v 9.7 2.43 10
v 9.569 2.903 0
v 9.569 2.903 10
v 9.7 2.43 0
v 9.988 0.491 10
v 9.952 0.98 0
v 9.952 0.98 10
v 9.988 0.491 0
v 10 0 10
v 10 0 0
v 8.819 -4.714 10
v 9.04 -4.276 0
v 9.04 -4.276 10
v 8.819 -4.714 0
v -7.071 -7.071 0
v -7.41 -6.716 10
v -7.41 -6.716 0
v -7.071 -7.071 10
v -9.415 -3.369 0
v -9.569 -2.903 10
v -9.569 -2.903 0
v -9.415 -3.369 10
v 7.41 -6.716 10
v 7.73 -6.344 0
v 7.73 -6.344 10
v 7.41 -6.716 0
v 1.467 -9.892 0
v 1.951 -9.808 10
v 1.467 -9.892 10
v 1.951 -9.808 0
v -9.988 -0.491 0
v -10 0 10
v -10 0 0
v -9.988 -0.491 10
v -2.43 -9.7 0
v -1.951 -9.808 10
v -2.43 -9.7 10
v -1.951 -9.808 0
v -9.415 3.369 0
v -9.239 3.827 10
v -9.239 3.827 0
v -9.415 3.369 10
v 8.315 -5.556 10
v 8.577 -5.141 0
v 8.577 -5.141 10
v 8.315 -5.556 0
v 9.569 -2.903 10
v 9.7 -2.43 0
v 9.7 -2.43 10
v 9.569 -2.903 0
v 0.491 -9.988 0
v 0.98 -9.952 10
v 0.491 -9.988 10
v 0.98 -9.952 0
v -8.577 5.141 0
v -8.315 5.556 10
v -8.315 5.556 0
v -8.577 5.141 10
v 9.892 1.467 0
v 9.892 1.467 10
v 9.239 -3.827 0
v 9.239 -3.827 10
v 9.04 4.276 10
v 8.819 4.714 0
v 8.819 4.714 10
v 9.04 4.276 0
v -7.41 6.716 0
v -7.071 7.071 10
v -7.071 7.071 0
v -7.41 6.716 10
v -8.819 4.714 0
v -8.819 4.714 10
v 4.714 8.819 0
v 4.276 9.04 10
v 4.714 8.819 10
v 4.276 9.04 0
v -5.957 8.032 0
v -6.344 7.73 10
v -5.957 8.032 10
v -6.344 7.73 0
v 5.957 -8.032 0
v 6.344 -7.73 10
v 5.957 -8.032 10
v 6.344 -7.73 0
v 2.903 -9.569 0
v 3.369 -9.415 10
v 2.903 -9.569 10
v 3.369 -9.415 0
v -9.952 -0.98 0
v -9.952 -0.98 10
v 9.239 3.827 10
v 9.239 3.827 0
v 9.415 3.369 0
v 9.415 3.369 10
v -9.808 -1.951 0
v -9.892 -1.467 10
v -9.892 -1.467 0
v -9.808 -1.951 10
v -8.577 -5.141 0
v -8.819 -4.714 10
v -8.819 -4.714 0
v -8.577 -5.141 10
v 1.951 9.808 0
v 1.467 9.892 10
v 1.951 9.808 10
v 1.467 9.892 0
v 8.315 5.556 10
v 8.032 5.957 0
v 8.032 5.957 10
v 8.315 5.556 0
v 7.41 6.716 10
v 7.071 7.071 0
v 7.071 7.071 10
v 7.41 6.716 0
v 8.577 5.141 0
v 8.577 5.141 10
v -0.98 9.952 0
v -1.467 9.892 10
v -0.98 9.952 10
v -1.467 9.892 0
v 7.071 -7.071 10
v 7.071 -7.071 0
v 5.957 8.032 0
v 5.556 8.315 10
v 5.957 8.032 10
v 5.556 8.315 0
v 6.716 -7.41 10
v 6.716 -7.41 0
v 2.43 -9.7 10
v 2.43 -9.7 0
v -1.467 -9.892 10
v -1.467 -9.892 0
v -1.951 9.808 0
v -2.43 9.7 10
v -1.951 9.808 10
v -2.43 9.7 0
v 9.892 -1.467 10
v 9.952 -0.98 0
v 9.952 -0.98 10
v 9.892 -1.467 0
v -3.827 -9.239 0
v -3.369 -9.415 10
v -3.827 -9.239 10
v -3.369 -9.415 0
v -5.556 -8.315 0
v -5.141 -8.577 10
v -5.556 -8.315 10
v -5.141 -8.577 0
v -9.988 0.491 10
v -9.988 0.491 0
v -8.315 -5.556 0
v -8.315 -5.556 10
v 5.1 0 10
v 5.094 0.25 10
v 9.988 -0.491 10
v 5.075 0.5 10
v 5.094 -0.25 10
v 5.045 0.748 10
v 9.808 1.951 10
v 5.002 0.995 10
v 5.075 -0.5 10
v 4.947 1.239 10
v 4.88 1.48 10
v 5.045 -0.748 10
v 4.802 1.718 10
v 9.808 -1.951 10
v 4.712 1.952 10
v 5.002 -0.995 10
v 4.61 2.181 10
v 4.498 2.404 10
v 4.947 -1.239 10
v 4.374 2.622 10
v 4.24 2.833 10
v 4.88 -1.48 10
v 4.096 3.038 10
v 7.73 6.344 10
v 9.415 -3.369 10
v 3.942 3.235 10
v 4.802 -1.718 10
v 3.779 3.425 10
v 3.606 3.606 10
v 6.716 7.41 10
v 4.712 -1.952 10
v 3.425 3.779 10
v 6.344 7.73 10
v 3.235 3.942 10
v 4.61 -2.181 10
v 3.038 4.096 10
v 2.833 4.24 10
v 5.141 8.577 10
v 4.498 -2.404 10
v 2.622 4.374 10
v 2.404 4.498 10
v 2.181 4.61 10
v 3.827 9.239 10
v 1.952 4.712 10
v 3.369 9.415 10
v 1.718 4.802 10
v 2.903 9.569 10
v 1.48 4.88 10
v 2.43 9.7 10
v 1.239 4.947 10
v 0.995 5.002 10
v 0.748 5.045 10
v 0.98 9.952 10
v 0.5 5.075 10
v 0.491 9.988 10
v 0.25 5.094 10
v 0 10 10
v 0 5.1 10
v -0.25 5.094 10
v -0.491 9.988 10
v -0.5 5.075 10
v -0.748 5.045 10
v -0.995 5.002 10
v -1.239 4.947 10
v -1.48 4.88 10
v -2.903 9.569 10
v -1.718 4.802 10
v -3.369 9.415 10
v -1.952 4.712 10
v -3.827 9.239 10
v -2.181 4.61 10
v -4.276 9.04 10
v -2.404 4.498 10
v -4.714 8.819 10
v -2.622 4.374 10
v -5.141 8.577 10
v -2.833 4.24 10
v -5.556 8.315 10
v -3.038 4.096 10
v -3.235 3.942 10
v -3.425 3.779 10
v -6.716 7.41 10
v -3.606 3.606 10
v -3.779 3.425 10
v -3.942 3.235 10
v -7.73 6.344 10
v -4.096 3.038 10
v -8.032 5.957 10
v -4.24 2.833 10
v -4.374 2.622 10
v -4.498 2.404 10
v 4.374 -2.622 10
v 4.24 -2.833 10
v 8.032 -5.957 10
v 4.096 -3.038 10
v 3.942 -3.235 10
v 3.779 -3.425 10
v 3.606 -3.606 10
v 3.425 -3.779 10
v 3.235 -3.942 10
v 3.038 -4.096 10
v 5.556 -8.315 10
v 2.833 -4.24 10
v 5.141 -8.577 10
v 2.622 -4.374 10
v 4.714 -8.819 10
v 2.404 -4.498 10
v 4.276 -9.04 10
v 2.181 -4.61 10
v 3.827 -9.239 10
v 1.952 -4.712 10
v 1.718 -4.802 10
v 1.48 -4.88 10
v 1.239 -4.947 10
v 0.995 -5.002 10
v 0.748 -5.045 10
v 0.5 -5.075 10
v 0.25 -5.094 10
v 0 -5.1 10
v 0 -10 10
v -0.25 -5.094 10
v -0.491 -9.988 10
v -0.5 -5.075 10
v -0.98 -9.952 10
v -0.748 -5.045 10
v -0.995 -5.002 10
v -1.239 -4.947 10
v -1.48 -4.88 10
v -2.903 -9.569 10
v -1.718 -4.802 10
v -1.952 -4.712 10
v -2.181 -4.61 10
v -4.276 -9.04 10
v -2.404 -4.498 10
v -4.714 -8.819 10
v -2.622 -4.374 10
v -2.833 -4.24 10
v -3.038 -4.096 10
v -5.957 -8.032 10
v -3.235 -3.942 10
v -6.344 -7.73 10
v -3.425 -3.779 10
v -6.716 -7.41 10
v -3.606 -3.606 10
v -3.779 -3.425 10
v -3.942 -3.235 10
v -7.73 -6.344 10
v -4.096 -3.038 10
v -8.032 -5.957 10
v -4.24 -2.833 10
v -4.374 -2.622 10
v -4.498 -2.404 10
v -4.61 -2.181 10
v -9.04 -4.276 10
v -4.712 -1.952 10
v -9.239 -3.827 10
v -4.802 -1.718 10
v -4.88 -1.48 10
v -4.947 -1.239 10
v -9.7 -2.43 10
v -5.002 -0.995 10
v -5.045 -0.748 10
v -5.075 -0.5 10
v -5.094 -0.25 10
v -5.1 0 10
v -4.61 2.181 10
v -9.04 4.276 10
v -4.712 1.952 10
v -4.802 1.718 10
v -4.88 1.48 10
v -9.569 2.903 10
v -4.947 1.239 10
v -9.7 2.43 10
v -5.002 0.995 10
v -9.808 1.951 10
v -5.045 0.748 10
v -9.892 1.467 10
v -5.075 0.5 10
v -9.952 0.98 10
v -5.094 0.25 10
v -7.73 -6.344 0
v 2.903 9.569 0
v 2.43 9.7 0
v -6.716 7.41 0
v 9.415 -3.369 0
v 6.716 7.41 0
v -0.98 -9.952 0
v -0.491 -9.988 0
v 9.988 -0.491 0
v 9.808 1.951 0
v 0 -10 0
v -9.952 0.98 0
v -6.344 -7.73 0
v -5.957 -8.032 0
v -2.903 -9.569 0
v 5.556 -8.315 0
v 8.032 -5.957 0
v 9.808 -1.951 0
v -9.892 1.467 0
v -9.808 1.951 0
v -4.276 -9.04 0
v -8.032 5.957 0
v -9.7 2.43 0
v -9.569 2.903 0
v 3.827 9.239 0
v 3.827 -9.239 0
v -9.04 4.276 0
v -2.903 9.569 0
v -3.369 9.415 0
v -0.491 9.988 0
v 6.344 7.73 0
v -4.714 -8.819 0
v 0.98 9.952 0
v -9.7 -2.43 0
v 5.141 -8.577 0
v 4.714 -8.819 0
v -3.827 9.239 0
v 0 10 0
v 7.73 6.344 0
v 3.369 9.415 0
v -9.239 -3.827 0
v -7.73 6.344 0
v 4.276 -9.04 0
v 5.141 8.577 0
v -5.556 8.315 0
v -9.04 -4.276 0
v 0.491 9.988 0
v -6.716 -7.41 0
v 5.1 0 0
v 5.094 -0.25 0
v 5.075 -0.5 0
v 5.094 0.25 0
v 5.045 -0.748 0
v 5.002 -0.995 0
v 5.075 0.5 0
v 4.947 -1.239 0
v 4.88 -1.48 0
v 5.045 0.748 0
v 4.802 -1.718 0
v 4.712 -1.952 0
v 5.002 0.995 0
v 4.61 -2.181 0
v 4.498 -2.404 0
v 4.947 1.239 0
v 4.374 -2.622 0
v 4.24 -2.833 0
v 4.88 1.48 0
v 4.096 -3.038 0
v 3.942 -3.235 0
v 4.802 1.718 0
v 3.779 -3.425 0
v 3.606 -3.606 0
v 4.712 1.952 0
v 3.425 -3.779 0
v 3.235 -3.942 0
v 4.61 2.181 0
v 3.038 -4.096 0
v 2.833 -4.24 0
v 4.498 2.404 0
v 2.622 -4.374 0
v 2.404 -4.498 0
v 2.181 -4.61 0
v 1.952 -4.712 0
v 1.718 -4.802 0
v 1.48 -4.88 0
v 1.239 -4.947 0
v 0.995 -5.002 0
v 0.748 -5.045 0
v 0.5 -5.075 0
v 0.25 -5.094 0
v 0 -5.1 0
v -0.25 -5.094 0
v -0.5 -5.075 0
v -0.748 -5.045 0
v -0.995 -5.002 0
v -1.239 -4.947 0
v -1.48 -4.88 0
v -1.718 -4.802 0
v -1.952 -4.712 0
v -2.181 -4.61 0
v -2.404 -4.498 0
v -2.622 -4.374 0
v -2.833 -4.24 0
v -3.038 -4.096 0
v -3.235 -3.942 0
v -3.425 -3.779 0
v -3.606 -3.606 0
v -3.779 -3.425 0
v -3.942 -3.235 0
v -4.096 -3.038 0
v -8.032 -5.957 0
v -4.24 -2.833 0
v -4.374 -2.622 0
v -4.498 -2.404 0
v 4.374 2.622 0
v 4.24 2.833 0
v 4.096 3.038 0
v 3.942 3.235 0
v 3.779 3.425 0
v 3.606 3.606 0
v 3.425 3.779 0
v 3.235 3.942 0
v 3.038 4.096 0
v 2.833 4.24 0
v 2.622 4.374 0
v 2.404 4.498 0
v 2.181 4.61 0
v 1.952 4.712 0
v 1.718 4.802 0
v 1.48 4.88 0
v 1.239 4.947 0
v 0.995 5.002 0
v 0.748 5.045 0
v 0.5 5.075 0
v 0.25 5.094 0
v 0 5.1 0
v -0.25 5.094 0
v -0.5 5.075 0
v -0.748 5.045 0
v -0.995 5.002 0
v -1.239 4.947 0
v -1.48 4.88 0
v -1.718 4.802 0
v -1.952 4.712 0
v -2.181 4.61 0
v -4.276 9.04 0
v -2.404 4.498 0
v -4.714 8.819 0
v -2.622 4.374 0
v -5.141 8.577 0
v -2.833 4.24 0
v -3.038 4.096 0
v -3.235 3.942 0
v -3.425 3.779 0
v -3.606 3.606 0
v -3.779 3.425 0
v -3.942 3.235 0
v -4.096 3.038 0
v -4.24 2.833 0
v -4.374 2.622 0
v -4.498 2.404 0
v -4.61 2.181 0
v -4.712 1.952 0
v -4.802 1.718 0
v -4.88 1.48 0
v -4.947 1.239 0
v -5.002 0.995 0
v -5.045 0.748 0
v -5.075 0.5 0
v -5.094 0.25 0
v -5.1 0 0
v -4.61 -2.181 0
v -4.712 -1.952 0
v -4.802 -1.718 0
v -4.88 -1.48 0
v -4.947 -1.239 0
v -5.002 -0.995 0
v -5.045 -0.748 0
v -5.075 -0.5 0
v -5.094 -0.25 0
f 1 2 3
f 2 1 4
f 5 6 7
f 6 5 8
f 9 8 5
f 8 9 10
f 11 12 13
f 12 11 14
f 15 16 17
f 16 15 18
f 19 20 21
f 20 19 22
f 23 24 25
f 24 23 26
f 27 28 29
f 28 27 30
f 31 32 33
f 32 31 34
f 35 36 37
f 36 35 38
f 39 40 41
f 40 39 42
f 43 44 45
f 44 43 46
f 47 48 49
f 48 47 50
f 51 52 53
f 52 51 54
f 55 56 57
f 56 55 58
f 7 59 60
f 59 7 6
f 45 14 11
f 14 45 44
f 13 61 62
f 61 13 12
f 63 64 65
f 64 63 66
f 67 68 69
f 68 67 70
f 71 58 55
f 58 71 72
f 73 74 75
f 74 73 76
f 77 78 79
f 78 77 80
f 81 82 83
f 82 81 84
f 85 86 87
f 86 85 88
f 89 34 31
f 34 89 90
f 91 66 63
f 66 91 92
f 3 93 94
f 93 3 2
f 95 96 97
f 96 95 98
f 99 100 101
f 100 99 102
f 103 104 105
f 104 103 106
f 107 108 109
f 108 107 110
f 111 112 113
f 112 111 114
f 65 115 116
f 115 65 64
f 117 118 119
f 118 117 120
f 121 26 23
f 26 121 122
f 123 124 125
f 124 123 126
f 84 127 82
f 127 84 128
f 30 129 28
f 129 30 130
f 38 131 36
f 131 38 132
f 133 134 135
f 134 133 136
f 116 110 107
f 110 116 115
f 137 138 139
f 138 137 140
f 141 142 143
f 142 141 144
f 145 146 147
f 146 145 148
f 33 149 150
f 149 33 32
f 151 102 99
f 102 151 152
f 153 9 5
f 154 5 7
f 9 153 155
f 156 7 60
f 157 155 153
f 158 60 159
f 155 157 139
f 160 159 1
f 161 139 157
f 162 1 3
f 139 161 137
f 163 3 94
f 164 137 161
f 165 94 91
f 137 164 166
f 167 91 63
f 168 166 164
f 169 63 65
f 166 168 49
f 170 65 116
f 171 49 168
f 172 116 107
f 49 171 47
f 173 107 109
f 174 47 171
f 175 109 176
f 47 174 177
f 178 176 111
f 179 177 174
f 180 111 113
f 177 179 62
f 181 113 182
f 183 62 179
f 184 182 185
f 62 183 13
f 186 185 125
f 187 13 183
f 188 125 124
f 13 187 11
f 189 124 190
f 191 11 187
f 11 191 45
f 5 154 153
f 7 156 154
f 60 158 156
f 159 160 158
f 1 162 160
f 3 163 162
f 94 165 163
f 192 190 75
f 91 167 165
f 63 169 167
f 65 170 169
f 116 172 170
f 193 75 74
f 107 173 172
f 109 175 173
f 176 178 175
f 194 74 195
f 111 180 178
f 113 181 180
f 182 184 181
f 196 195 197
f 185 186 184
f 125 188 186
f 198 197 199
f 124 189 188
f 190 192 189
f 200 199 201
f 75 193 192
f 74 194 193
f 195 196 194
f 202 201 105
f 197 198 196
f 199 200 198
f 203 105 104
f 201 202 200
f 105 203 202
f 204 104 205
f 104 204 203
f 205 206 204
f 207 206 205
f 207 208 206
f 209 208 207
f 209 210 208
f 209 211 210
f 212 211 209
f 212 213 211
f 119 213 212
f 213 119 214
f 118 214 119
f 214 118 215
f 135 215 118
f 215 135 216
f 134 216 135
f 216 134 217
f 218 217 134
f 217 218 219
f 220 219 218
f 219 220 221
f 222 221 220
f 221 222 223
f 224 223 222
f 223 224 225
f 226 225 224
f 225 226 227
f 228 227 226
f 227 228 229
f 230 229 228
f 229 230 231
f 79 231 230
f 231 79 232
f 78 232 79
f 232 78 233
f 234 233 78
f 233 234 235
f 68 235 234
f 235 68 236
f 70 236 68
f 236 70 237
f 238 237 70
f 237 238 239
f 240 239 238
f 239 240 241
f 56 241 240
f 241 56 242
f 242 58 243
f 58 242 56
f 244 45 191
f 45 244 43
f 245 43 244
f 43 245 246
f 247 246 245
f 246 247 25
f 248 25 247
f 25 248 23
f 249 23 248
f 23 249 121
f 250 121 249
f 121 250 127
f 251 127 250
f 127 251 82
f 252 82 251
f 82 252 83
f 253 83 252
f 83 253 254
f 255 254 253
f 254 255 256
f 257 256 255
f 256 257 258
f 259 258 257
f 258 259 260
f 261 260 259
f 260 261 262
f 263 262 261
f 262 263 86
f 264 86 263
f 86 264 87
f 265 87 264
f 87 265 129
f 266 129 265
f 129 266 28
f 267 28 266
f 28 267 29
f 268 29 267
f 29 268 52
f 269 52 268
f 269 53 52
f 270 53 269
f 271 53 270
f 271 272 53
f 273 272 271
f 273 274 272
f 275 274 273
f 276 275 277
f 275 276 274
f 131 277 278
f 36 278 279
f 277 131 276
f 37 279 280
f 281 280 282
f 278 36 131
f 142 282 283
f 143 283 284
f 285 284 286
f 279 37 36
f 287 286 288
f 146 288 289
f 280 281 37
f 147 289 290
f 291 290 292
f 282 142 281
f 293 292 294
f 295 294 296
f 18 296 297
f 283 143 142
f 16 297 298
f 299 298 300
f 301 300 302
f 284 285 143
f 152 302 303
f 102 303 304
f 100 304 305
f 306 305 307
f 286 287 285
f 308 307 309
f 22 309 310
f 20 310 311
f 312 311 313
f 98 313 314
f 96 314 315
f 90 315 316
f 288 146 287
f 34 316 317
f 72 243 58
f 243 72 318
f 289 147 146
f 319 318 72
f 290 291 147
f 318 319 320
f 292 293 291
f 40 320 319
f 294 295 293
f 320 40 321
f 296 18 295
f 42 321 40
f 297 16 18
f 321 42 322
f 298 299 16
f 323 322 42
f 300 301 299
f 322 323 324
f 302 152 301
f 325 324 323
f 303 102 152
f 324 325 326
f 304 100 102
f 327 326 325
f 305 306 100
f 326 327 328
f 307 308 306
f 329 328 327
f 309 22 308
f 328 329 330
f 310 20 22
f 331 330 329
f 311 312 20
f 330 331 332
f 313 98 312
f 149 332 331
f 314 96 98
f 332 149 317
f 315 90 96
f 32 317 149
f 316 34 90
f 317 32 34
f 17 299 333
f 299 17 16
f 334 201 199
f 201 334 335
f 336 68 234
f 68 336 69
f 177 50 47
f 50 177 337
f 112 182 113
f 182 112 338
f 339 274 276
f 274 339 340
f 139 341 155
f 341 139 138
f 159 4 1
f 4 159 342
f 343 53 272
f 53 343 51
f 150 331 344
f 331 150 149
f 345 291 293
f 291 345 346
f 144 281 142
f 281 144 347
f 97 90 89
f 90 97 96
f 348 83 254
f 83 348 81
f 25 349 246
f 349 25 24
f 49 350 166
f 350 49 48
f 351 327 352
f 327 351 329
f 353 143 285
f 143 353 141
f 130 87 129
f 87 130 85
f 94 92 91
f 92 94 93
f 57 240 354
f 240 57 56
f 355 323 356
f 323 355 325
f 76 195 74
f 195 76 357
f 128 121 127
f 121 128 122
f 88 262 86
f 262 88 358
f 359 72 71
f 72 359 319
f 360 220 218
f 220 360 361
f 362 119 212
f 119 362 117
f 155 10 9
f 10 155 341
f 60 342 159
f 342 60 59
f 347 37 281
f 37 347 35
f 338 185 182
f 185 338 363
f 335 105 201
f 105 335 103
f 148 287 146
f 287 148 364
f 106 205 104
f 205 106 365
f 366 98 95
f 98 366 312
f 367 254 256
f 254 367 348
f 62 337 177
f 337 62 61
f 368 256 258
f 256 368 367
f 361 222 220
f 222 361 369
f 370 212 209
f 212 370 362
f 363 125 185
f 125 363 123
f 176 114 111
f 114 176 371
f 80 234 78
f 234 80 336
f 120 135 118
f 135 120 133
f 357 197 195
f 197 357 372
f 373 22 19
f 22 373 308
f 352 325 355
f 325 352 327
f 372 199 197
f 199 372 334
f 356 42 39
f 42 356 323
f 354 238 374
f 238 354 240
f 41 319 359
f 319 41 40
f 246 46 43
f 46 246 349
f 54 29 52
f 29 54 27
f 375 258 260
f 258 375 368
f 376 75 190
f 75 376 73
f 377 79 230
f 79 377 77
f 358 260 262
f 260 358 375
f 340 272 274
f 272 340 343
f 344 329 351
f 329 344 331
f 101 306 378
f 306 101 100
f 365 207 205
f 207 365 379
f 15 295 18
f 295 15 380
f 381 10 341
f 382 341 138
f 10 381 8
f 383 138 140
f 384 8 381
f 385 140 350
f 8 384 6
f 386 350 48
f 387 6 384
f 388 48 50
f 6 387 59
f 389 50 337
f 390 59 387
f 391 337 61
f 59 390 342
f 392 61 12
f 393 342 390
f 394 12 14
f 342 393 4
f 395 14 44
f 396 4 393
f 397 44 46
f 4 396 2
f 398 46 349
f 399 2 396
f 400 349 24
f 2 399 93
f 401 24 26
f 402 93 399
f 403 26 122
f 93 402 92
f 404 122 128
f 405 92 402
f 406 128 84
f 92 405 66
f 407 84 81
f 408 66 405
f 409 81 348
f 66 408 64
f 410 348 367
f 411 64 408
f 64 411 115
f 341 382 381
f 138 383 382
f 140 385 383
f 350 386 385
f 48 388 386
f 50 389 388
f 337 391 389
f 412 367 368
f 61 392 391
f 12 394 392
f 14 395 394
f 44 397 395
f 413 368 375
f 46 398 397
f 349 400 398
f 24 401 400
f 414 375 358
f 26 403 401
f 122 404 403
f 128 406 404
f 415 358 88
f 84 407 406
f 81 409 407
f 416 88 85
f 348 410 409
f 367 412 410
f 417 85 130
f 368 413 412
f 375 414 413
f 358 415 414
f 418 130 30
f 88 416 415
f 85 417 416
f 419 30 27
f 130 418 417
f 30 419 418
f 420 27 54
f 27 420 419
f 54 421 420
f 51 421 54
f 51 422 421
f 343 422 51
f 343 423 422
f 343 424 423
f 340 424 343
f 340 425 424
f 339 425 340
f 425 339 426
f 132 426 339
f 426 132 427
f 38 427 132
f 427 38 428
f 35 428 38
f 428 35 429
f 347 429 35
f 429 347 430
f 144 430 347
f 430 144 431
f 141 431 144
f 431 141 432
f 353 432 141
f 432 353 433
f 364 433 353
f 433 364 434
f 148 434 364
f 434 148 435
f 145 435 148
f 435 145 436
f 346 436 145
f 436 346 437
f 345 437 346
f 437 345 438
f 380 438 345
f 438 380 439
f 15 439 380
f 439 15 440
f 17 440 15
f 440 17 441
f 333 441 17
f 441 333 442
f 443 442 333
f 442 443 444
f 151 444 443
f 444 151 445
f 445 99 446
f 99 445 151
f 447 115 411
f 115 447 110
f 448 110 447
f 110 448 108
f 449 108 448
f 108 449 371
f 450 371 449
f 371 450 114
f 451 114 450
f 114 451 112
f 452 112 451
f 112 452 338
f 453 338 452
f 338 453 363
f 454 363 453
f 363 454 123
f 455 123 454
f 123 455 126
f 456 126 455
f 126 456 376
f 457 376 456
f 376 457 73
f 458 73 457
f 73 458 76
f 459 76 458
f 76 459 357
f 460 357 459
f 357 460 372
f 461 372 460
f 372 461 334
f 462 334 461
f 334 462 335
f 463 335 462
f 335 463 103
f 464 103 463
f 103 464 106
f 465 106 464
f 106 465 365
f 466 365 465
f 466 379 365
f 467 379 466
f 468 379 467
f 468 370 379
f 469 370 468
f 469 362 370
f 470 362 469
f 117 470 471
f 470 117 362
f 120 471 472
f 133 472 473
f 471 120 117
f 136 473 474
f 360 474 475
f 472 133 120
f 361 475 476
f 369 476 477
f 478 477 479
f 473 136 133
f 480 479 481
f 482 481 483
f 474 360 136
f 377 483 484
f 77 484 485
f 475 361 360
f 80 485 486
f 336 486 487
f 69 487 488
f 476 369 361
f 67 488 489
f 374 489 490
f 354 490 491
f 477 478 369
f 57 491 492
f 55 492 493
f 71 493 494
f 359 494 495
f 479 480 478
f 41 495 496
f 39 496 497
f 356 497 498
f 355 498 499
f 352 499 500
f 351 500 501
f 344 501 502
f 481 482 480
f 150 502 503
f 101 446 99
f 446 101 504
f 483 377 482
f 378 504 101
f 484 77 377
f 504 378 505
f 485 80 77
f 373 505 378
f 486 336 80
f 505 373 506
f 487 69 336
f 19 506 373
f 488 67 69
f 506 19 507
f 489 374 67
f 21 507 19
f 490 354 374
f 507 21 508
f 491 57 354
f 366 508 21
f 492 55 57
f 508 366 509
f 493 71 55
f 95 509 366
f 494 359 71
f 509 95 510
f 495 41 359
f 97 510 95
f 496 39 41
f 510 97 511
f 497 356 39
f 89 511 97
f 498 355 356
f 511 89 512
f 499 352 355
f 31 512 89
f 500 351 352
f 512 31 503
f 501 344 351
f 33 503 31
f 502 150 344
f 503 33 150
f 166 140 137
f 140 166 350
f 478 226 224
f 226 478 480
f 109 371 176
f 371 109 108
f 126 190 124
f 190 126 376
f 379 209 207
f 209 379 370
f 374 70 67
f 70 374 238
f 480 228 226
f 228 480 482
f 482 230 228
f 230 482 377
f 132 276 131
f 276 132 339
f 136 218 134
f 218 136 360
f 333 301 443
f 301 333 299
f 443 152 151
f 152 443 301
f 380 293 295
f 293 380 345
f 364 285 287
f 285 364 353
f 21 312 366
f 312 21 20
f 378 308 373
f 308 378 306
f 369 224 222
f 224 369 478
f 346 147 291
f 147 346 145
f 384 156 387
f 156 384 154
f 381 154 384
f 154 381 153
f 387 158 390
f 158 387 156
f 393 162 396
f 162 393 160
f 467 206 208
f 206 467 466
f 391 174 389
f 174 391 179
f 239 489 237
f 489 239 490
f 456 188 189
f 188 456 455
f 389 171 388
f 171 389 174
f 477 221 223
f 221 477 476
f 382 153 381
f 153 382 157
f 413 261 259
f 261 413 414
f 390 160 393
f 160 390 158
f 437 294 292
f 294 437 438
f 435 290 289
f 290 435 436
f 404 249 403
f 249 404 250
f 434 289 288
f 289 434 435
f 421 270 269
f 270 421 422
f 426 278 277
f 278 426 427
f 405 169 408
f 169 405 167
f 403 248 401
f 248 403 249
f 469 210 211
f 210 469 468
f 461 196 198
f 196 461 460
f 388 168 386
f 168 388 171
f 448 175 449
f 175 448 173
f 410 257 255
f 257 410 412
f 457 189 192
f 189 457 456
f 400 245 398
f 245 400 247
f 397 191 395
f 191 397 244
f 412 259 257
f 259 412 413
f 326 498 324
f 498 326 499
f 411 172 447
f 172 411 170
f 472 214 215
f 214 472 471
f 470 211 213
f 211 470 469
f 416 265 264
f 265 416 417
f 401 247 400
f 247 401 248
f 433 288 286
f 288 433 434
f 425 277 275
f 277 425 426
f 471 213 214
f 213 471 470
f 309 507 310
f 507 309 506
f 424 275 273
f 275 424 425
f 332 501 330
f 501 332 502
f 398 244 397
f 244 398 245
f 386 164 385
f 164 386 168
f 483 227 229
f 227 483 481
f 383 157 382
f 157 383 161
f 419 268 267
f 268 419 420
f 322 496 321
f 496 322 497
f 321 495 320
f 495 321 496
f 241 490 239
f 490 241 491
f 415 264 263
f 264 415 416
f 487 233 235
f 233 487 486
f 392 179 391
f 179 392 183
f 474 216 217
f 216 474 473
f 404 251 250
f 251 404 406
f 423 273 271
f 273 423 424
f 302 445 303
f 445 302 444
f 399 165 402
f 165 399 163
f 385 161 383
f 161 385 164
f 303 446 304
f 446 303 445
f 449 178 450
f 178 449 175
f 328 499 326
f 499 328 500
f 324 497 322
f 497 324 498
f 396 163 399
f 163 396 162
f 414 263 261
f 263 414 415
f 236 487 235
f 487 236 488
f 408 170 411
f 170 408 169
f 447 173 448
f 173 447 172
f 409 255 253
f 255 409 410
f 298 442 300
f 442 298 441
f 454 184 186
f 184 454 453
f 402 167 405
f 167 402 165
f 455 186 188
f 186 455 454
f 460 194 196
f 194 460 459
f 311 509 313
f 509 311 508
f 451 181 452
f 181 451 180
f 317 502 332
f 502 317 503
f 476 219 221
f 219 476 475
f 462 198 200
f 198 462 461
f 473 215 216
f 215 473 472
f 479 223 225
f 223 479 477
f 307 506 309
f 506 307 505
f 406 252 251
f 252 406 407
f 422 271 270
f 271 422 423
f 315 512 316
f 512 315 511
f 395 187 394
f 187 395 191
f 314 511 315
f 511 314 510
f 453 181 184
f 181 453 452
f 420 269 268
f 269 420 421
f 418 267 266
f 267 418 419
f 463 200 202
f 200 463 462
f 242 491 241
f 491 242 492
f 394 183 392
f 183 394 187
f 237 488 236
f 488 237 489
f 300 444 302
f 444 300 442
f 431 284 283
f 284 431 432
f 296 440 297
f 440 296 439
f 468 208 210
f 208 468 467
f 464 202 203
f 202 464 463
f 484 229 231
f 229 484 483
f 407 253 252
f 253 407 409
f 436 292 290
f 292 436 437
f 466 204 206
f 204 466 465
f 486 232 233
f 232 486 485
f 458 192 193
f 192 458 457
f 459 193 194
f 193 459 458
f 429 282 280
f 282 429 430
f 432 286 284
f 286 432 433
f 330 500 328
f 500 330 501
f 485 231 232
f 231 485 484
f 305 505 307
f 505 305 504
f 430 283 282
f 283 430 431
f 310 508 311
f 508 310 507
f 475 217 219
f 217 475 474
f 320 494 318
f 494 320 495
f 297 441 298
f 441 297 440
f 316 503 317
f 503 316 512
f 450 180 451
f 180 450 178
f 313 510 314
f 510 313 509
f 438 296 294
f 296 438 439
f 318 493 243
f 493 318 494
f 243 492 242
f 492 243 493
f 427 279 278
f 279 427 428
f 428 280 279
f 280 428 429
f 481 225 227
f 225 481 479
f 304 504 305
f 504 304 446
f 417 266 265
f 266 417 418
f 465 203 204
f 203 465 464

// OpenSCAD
// Suporte para mecanismo de relógio
// Dimensões em mm

outer_diameter = 20.0;
inner_diameter = 10.2;
height = 10.0;

$fn = 128;

difference() {
    cylinder(d = outer_diameter, h = height);
    translate([0, 0, -0.1])
        cylinder(d = inner_diameter, h = height + 0.2);
}
